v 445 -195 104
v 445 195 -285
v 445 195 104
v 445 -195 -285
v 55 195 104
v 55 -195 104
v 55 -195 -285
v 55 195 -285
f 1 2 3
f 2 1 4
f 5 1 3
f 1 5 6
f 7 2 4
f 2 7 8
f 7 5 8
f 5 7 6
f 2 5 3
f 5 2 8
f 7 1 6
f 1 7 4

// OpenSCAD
// file: variables.scad
// Pinya3 3D Food Printer
// file: variables.scad 
// author: Luis Rodriguez
// version: 0.1
// w3b: 3digitalcooks.com 

// Variables for all the project
// just numbers??
alpha = 0.7;

// PRINTING AREA
// from: https://www.marginallyclever.com/other/samples/fk-ik-test.html
// Base radius (f) = 100mm
// End Effector radius (e) = 30mm
// Bice length (rf) = 320mm
// Forearm length = 350mm
//X=-194.288 to 194.288 mm
//Y=-194.288 to 194.288 mm
//Z=-540.222 to -151.646 mm
printing_area_alpha = 0.2;
printing_area_x = 195*2;
printing_area_y = 195*2;
printing_area_z = 540-151;
printing_area_distance_from_motors_base = 151;
printing_area_x_displacement = 250;

// MOTORS BASE
motors_base_alpha = alpha;
motors_base_thickness = 5;
motors_base_rad = 100;

// FRAME 
frame_alpha = alpha;
frame_profile_width = 30;

frame_height = 500;
frame_width = 250;  // 250mm -> 7capsules~de 8cm
frame_lenght = 250;

// DELTA BEAM
delta_beam_alpha = alpha;
delta_beam_length = printing_area_x_displacement 
                    + motors_base_rad 
                    + frame_width/2;
echo("Delta beam lenght = ", delta_beam_length);
delta_beam_profile_width = 60;
delta_beam_under_frame = 1; // 1 = Beam under frame or 0 = Beam on frame


// CAROUSEL
carousel_alpha = 0.3;
carousel_number_of_tools = 7;
carousel_offset_rotation = 0; // in degrees
carousel_rad = frame_width/2 - 30;//160;
carousel_tool_height = 200;
carousel_tool_rad = 40;
// main file
// Pinya3 3D Food Printer
// file: printing_area.scad 
// author: Luis Rodriguez
// version: 0.1
// w3b: 3digitalcooks.com

include <variables.scad>

printing_area();

module printing_area(){
  difference(){
    union(){ // Add
      color("ForestGreen", printing_area_alpha)
      translate([printing_area_x_displacement, 
                 0,
                 (frame_height - printing_area_z)/2 
                 - printing_area_distance_from_motors_base
                 + motors_base_thickness
                 ])
        cube([printing_area_x, printing_area_y, printing_area_z], center=true);
      }
    union(){ // Substract
      }
  }
}
